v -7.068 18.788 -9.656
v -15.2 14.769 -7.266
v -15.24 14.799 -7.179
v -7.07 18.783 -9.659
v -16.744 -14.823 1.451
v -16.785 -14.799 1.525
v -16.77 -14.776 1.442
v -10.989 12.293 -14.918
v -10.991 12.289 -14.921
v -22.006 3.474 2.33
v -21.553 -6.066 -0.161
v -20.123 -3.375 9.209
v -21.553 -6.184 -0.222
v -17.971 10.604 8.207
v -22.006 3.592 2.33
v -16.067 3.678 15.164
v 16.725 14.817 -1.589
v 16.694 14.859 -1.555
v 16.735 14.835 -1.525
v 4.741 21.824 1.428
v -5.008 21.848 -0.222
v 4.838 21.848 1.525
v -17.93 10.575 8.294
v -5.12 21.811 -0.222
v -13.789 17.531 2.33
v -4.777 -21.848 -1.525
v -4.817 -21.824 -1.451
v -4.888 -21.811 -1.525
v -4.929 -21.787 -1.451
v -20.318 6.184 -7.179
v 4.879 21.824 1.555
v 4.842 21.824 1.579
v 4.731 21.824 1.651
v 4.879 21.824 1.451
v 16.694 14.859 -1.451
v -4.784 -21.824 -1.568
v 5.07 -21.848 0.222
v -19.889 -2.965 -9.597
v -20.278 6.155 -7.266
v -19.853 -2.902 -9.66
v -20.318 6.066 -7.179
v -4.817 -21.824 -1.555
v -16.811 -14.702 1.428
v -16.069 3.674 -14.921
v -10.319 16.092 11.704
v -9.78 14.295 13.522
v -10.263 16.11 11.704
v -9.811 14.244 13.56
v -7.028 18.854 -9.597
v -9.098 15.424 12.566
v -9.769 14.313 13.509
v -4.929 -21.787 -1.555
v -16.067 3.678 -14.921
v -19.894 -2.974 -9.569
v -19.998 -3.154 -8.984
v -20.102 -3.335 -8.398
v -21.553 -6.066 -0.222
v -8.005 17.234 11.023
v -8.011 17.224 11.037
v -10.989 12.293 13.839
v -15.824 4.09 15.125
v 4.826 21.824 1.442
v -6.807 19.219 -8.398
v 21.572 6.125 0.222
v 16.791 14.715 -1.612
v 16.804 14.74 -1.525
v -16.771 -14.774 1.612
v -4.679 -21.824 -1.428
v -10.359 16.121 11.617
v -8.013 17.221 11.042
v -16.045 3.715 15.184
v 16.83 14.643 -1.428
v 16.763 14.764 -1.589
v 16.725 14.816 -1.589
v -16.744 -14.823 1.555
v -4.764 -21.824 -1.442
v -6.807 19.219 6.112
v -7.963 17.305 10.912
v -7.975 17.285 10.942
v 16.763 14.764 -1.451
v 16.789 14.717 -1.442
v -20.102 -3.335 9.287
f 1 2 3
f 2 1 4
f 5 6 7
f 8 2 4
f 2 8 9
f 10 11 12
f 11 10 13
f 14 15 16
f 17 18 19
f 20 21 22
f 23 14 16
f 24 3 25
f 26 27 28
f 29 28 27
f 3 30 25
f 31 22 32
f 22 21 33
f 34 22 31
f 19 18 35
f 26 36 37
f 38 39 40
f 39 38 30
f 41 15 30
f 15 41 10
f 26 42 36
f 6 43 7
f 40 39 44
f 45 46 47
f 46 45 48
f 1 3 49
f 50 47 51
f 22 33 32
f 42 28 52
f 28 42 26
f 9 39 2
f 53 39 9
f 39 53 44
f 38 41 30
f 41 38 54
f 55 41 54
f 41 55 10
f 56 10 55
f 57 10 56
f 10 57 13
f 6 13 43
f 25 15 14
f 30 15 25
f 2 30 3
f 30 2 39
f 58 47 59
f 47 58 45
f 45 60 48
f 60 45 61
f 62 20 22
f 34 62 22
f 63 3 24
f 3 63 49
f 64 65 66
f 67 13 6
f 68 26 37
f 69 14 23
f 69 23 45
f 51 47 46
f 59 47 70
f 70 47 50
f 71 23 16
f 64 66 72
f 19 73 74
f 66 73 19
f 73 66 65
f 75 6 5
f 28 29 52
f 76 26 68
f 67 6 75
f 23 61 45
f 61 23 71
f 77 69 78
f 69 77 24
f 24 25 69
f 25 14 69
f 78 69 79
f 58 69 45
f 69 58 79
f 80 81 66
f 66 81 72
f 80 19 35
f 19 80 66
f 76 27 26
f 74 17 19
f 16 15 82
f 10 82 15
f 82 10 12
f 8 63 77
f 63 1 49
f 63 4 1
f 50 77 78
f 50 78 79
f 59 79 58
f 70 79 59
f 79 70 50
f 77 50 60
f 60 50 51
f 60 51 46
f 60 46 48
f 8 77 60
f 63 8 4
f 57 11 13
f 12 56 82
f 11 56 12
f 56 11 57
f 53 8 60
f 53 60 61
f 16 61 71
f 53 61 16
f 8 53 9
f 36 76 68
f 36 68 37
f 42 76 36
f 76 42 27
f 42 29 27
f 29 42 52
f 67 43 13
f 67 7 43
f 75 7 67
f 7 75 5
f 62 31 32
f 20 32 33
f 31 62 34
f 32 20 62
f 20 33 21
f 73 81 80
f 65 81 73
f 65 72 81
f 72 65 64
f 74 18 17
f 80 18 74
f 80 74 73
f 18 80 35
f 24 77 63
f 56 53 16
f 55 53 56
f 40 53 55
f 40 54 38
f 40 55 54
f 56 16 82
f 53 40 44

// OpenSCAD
// Auto-generated OpenSCAD file

    inner_points = 10*[[-2.147181721933595, -0.6125228911105931, -0.022233721226839975], [1.4975738002339152, 1.2171443618142557, 1.123343354837028], [-1.6663340255978591, -1.4763745869015392, -0.1723861125089058], [1.9784214965696507, 0.35329266602330955, 0.9731909635549623], [-1.9784214965696507, -0.35329266602330955, -0.9731909635549623], [1.6663340255978591, 1.4763745869015392, 0.1723861125089058], [-1.4975738002339152, -1.2171443618142557, -1.123343354837028], [2.147181721933595, 0.6125228911105931, 0.022233721226839975], [-1.0280687737374308, -0.3330955036984619, 1.954018925031606], [-0.1676587091381568, 0.0988303441971033, 2.224452988448126], [-0.547221077401695, -1.1969471994894083, 1.80386653374954], [0.313188987197579, -0.765021351593843, 2.07430059716606], [-0.313188987197579, 0.765021351593843, -2.07430059716606], [0.547221077401695, 1.1969471994894083, -1.80386653374954], [0.1676587091381568, -0.0988303441971033, -2.224452988448126], [1.0280687737374308, 0.3330955036984619, -1.954018925031606], [-0.6726268446335121, 1.9160150643285994, 0.9287235210998099], [0.503866619269568, -2.1752452894158827, 0.022233721228312353], [2.0237176723082113, -0.6125228911102443, 0.7179487921524583], [-0.503866619269568, 2.1752452894158827, -0.022233721228312353], [0.6726268446335121, -1.9160150643285994, -0.9287235210998099], [2.1924778976721555, -0.3532926660229606, -0.23300845017566402], [0.927058622781811, 1.9121577495628521, 0.685771848512618], [-0.927058622781811, -1.9121577495628521, -0.685771848512618], [1.3708203463401416, -1.7471767562861986, -0.23300845017492777], [-1.4315815123496172, -1.0343501578436425, 1.3662950274254113], [0.8210012810337749, 0.09644639256656445, 2.0743005971656054], [-0.8210012810337749, -0.09644639256656445, -2.0743005971656054], [1.4315815123496172, 1.0343501578436425, -1.3662950274254113], [-1.0907716573533395, 1.2233856282105418, 1.516447418706741], [0.6489516514014413, -1.9020591684003363, 0.9731909635561535], [-0.6489516514014413, 1.9020591684003363, -0.9731909635561535], [1.0907716573533395, -1.2233856282105418, -1.516447418706741], [-2.0020966898017214, -0.33933677009504604, 0.9287235211010012], [0.7822487677665146, 1.0584046349342373, 1.8038665337483493], [-1.2240687737184126, -1.7370781751240318, 0.6857718485145453], [1.5602766838498234, -0.3393367700947481, 1.5609148611618933], [-1.5602766838498234, 0.3393367700947481, -1.5609148611618933], [1.2240687737184126, 1.7370781751240318, -0.6857718485145453], [-0.7822487677665146, -1.0584046349342373, -1.8038665337483493], [2.0020966898017214, 0.33933677009504604, -0.9287235211010012], [-1.5985839511895352, 0.36191788405013425, 1.516447418707196], [-0.20641122240541715, 1.0607885865647761, 1.9540189250308702], [-0.33970833877049067, -1.8996752167697974, 1.1233433548386742], [1.0524643900136275, -1.2008045142551556, 1.5609148611623485], [-1.0524643900136275, 1.2008045142551556, -1.5609148611623485], [0.33970833877049067, 1.8996752167697974, -1.1233433548386742], [0.20641122240541715, -1.0607885865647761, -1.9540189250308702], [1.5985839511895352, -0.36191788405013425, -1.516447418707196], [0.21173359031441008, 1.7534180226828338, 1.366295027423939], [-0.48479337090236396, -2.1728613377853443, 0.17238611251083324], [1.5159053784720158, -1.473990635270652, 0.7179487921529134], [0.48479337090236396, 2.1728613377853443, -0.17238611251083324], [-0.21173359031441008, -1.7534180226828338, -1.366295027423939], [1.7889651590599696, -1.0545473201681412, -0.8207323477818588]];

    outer_points = 10*[[0.8723958733185133, 0.06615064908058033, -2.0544141523419364], [0.15751608677391848, -1.0319662062139903, 1.973905369854271], [0.8270996975796362, 1.0319662062139903, -1.7991719809389455], [0.11221991103504136, -0.06615064908058033, 2.229147541257262], [-0.11221991103504136, 0.06615064908058033, -2.229147541257262], [-0.8270996975796362, -1.0319662062139903, 1.7991719809389455], [-0.15751608677391848, 1.0319662062139903, -1.973905369854271], [-0.8723958733185133, -0.06615064908058033, 2.0544141523419364], [2.1924778976724366, -0.35329266602279574, -0.23300845017327093], [2.0237176723073724, -0.6125228911106142, 0.7179487921545069], [2.1471817219335594, 0.6125228911106142, 0.022233721229720005], [1.9784214965684954, 0.35329266602279574, 0.9731909635574978], [-1.9784214965684954, -0.35329266602279574, -0.9731909635574978], [-2.1471817219335594, -0.6125228911106142, -0.022233721229720005], [-2.0237176723073724, 0.6125228911106142, -0.7179487921545069], [-2.1924778976724366, 0.35329266602279574, 0.23300845017327093], [0.5038666192695755, -2.1752452894158876, 0.022233721227690392], [0.4807491650839791, 2.1752452894158876, 0.15249966768763507], [0.14717764696877234, 0.9136323277340612, 2.0321620721418276], [-0.4807491650839791, -2.1752452894158876, -0.15249966768763507], [-0.5038666192695755, 2.1752452894158876, -0.022233721227690392], [-0.8374381373847823, 0.9136323277340612, 1.8574286832265023], [-0.24599665183756222, -1.7332208603588481, 1.3861814722472068], [0.24599665183756222, 1.7332208603588481, -1.3861814722472068], [-0.16086561818353615, 2.034330296982295, 0.9064714408993516], [2.0020966898028134, 0.33933677009559726, -0.9287235210984455], [1.5602766838479842, -0.33933677009559726, 1.560914861163547], [-1.5602766838479842, 0.33933677009559726, -1.560914861163547], [-2.0020966898028134, -0.33933677009559726, 0.9287235210984455], [1.3708203463404445, -1.7471767562860465, -0.23300845017428576], [1.2069372429567986, 1.7471767562860465, 0.690466401324062], [-1.2069372429567986, -1.7471767562860465, -0.690466401324062], [-1.3708203463404445, 1.7471767562860465, 0.23300845017428576], [1.598583951191333, -0.3619178840492606, -1.5164474187055097], [1.0524643900118018, -1.2008045142560126, 1.56091486116292], [1.5252931992854413, 1.2008045142560126, -1.103456910013144], [0.9791736381059102, 0.3619178840492606, 1.9739053698552858], [-0.9791736381059102, -0.3619178840492606, -1.9739053698552858], [-1.5252931992854413, -1.2008045142560126, 1.103456910013144], [-1.0524643900118018, 1.2008045142560126, -1.56091486116292], [-1.598583951191333, 0.3619178840492606, 1.5164474187055097], [1.7889651590609557, -1.0545473201676536, -0.820732347780335], [1.5159053784711902, -1.4739906352710297, 0.7179487921538799], [1.6703782314161868, 1.4739906352710297, -0.1524996676849783], [1.3973184508264214, 1.0545473201676536, 1.3861814722492365], [-1.3973184508264214, -1.0545473201676536, -1.3861814722492365], [-1.6703782314161868, -1.4739906352710297, 0.1524996676849783], [-1.5159053784711902, 1.4739906352710297, -0.7179487921538799], [-1.7889651590609557, 1.0545473201676536, 0.820732347780335], [0.6489516514003212, -1.9020591684008705, 0.9731909635558559], [0.9441901535433673, 1.9020591684008705, -0.6904664013214051], [0.5653224596892834, 1.6062617638524541, 1.4444381745357786], [-0.9441901535433673, -1.9020591684008705, 0.6904664013214051], [-0.6489516514003212, 1.9020591684008705, -0.9731909635558559], [-1.027819345254405, 1.6062617638524541, 1.1617136123013276]];

    // Convex hull for inner set (I)
    module inner_hull() {
        hull() {
            for (p = inner_points) {
                translate(p) sphere(r=0.1);
            }
        }
    }

    // Convex hull for outer set (O) minus inner hull (O \ I)
    module outer_minus_inner() {
        difference() {
            hull() {
                for (p = outer_points) {
                    translate(p) sphere(r=0.1);
                }
            }
            inner_hull(); // Subtract inner hull
        }
    }

    // Convex hull for outer set (O) minus all translated inner hulls
    module outer_minus_AllTranslationInner() {
        difference() {
            hull() {
                for (p = outer_points) {
                    translate(p) sphere(r=0.1);
                }
            }
            hull() {
                translate([0,0,50]) inner_hull();
                translate([0,0,-50]) inner_hull();
            }; // Subtract translated inner hulls
        }
    }

    // Difference between outer_minus_inner and outer_minus_AllTranslationInner
    module outer_minus_inner_diff() {
        difference() {
            // Outer minus inner
            difference() {
                hull() {
                    for (p = outer_points) {
                        translate(p) sphere(r=0.1);
                    }
                }
                inner_hull();
            }

            // Subtract Outer minus AllTranslationInner
            difference() {
                hull() {
                    for (p = outer_points) {
                        translate(p) sphere(r=0.1);
                    }
                }
                hull() {
                    translate([0,0,50]) inner_hull();
                    translate([0,0,-50]) inner_hull();
                };
            }
        }
    }

    // Rendering all with colors applied
    color([0, 1, 0, 1]) outer_minus_AllTranslationInner(); // Opaque green
    
